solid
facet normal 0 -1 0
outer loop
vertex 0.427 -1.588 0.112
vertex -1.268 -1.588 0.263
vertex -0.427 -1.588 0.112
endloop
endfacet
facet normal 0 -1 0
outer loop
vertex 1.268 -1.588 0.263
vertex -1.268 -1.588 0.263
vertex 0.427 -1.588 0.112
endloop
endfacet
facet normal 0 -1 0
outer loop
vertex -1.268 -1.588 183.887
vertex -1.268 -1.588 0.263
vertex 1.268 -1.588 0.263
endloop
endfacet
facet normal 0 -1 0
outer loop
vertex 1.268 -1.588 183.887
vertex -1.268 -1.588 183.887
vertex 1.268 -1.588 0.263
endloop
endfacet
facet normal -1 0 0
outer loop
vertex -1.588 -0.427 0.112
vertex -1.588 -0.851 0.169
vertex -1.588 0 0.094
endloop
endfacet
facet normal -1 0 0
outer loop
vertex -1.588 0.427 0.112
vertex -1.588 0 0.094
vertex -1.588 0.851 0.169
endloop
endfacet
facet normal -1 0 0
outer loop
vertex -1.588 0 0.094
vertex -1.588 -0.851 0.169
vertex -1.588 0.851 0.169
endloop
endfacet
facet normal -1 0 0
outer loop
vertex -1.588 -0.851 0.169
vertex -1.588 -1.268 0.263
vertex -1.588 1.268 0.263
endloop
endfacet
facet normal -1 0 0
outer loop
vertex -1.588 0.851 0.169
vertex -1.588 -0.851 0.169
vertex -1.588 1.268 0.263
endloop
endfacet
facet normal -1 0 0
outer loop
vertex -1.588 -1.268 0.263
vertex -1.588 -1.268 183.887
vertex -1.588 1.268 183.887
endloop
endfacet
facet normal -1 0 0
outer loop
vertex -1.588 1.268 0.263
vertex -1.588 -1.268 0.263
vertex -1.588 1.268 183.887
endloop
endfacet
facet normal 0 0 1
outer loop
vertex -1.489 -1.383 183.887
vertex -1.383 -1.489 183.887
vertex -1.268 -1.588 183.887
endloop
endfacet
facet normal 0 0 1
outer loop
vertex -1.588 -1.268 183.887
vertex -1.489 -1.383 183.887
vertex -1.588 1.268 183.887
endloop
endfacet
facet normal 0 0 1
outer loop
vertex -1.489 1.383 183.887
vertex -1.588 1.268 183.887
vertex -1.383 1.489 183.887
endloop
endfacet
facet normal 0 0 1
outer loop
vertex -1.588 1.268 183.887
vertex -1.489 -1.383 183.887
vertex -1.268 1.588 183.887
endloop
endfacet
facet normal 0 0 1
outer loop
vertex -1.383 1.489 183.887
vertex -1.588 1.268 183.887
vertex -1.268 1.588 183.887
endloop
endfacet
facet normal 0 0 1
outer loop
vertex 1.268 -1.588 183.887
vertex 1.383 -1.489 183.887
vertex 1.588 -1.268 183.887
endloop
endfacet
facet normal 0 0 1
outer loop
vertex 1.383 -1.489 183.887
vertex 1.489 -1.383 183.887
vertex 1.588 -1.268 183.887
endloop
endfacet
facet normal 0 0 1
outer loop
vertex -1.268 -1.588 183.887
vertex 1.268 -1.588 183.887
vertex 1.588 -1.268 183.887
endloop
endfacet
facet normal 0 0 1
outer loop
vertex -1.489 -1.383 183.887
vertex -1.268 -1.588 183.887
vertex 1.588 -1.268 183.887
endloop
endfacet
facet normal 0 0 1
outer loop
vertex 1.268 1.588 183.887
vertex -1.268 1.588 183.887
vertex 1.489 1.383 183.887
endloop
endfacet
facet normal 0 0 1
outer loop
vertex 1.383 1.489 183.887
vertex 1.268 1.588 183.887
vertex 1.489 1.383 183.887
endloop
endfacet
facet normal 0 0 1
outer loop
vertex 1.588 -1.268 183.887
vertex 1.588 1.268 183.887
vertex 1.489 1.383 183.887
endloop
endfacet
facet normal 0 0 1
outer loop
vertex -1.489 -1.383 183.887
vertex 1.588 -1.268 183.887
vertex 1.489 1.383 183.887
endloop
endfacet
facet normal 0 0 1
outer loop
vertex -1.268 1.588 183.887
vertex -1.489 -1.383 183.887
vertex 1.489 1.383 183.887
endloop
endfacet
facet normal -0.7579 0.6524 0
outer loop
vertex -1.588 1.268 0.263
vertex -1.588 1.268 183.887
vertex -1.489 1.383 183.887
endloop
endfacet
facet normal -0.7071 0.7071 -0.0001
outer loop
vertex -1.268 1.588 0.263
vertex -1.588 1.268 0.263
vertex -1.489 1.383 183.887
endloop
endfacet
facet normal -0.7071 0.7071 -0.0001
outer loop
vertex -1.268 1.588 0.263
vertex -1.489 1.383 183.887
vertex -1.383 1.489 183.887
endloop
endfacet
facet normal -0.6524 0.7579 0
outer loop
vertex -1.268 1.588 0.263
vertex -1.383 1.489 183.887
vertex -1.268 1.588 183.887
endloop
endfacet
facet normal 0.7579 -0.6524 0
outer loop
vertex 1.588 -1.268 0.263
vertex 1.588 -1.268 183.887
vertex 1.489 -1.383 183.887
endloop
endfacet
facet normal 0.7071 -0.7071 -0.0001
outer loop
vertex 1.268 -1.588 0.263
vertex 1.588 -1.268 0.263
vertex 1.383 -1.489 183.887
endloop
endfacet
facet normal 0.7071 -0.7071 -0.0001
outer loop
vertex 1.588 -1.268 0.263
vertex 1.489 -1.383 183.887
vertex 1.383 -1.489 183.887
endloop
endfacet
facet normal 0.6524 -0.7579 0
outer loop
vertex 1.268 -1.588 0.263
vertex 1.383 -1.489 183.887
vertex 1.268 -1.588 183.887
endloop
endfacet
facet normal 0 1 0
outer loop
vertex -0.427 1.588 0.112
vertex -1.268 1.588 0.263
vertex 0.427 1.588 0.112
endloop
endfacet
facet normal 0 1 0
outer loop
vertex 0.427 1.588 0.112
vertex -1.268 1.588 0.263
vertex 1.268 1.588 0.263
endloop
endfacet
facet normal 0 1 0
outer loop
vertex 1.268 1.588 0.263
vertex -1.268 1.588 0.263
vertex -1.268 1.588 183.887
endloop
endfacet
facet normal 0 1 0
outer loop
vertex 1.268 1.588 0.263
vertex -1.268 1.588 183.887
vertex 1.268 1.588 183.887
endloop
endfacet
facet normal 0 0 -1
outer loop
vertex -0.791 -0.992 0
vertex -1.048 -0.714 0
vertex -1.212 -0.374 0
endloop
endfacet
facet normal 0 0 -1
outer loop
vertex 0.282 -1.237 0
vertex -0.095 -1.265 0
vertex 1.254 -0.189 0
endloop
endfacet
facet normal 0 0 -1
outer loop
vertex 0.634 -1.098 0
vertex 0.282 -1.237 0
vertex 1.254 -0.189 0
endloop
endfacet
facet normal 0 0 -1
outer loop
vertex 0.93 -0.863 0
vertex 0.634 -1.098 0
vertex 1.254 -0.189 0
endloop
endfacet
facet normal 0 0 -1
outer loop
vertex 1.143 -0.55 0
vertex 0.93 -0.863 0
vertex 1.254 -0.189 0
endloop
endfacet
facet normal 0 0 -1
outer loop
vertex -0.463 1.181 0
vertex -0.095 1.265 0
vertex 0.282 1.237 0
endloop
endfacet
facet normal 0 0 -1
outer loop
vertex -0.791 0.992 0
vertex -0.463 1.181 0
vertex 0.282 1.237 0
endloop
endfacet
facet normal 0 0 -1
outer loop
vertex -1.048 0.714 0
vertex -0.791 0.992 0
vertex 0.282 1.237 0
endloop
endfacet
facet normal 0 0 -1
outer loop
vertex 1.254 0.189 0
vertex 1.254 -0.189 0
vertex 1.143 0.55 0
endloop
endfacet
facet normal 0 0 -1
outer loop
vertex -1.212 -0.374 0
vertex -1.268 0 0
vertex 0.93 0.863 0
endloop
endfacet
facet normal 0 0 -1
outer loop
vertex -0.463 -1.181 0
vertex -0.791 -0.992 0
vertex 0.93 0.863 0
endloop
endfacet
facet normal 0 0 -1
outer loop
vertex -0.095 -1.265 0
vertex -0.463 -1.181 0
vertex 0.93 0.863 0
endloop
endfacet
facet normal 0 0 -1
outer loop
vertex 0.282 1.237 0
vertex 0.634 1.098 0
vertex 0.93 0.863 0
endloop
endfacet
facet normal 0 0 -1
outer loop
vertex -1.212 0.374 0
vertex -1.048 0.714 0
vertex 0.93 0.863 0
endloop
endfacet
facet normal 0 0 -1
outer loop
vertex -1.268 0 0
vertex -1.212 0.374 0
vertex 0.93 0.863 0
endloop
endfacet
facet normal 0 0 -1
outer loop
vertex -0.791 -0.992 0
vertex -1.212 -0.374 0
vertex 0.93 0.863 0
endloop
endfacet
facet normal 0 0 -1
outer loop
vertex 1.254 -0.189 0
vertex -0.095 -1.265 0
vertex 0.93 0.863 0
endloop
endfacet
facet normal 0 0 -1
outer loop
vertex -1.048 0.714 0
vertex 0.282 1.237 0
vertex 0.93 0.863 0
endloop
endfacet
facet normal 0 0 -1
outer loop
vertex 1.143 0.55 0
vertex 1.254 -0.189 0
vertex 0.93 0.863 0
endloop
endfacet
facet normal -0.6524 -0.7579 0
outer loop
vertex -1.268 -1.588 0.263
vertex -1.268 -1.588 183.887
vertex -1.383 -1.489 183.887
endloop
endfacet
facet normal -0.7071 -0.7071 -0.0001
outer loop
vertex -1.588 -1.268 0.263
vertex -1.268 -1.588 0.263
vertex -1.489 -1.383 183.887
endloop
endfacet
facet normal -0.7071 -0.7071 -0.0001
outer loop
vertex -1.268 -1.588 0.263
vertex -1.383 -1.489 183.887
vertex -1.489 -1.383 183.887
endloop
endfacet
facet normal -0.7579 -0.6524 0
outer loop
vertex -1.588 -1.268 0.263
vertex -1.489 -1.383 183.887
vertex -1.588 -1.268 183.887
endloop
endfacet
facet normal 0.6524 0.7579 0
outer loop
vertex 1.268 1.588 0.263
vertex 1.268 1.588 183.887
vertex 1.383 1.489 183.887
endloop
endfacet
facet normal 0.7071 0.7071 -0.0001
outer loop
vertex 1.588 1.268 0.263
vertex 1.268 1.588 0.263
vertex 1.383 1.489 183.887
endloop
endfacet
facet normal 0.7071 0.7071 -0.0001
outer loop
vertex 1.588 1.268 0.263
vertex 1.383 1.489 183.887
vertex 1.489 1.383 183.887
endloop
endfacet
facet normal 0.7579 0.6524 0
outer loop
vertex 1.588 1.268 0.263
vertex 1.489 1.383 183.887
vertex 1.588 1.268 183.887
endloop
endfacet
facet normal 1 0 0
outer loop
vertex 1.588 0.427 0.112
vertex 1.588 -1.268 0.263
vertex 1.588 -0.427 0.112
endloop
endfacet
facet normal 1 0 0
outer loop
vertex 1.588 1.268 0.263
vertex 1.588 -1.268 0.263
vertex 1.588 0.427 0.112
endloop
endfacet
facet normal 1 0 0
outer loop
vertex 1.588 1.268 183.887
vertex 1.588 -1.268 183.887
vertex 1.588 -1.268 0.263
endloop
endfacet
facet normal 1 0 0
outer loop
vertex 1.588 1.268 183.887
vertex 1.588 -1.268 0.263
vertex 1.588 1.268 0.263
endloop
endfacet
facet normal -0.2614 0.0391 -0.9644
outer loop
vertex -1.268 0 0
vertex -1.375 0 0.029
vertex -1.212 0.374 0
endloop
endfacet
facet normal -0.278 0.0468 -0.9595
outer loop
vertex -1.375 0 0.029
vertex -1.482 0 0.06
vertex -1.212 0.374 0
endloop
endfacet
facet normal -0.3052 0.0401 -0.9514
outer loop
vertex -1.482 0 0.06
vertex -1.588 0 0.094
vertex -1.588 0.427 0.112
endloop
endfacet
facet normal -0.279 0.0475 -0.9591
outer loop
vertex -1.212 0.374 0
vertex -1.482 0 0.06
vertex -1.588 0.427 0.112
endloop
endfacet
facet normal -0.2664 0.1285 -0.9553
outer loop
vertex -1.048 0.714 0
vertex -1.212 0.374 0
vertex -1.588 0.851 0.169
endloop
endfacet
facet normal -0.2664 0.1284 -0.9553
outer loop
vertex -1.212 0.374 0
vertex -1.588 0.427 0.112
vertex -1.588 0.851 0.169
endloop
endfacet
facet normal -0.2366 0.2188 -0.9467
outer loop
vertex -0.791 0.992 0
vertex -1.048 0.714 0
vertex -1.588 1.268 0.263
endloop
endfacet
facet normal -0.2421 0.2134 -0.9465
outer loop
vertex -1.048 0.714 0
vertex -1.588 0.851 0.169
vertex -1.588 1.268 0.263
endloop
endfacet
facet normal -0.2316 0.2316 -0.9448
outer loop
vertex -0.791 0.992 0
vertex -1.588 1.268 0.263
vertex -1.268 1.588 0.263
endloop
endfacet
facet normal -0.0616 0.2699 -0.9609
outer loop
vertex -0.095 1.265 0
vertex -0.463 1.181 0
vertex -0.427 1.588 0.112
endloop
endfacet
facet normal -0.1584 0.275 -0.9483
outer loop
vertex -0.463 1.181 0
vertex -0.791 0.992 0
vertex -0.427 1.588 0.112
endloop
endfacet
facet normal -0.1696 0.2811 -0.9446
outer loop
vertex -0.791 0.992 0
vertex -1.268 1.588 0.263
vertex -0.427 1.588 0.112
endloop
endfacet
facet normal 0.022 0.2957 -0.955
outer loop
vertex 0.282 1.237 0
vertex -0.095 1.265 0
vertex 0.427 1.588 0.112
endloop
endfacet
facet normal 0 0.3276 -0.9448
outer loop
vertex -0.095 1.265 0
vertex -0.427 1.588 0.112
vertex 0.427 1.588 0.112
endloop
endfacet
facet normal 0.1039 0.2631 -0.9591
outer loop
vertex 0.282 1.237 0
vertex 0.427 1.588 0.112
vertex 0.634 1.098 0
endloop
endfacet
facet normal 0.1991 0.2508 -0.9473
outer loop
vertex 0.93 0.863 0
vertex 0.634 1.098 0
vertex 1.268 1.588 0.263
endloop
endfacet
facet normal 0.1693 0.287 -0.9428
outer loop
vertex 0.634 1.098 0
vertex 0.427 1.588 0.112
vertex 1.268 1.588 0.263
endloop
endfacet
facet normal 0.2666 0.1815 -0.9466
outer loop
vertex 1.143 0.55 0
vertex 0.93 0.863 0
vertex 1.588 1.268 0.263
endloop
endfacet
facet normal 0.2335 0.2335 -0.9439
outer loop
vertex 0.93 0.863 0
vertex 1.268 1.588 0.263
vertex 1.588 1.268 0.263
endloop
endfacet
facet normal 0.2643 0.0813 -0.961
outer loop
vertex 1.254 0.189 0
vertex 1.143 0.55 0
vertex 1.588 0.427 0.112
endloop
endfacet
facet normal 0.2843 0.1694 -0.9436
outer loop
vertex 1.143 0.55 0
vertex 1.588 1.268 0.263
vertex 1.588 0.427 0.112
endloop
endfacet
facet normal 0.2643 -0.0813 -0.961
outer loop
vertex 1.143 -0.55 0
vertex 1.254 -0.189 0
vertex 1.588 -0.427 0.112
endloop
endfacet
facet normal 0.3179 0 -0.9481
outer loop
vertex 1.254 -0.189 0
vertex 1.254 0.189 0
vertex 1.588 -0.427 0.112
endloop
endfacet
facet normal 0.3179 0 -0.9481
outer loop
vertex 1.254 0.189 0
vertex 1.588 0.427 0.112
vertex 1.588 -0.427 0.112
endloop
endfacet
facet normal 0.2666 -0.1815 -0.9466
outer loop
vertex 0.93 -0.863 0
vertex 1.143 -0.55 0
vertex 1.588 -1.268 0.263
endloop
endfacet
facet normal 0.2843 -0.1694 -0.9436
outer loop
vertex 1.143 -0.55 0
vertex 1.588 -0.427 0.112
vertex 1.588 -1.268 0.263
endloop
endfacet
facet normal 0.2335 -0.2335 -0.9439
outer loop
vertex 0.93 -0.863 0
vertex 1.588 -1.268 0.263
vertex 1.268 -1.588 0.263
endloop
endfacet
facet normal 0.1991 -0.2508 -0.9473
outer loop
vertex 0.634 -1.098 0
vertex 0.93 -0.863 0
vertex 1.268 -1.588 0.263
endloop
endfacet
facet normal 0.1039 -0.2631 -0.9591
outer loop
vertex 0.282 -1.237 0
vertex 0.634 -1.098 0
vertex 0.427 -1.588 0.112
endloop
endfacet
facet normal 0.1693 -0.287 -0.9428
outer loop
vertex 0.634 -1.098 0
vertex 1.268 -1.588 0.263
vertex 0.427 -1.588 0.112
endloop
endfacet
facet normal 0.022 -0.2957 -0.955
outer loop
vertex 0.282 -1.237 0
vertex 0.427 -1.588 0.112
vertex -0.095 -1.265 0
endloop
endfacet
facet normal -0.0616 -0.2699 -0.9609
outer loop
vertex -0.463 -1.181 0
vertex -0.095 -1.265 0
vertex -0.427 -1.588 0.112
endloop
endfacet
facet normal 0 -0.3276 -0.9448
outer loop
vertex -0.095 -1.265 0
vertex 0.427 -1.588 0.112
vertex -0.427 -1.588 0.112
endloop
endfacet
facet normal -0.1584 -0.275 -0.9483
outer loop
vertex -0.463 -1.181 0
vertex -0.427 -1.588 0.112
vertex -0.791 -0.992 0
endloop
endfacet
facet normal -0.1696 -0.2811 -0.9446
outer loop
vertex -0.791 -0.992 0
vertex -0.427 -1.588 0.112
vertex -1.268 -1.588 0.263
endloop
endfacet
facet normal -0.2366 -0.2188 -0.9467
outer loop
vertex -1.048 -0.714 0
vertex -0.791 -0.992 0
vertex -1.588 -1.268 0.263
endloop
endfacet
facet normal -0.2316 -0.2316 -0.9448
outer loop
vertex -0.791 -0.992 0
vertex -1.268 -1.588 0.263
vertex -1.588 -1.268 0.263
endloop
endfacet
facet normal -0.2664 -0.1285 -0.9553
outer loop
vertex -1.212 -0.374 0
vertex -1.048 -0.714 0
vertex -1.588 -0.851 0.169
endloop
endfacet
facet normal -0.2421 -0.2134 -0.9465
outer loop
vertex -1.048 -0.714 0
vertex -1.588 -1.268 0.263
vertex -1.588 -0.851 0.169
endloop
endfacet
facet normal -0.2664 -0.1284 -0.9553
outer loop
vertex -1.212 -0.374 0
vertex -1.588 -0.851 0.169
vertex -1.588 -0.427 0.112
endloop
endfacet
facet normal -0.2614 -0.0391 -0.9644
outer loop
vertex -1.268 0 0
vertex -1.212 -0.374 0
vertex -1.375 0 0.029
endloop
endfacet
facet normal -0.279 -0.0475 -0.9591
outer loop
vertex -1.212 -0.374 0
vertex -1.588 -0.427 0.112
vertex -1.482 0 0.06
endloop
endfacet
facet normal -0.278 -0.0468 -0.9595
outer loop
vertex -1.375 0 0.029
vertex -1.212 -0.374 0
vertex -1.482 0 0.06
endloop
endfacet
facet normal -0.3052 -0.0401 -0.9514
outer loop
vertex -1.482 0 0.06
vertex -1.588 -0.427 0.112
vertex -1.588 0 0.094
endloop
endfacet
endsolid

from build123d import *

# Parameters (mm, degrees)
SKETCH1_W           = 3.175
SKETCH1_H           = 3.175
BOSS_EXTRUDE1_DEPTH = 152.4
SKETCH2_OUTSIDE_W   = 35.668
SKETCH2_OUTSIDE_H   = 35.668
SKETCH2_OUTSIDE_R   = 2.032
CUT_EXTRUDE1_DEPTH  = 153.416535561
SKETCH4_W           = 120.65
SKETCH4_H           = 3.175
CUT_EXTRUDE2_DEPTH  = 305.820669872


with BuildPart() as part:
    # Sketch1 → Boss-Extrude1 (new body)
    with BuildSketch(Plane.XY):
        Rectangle(SKETCH1_W, SKETCH1_H)
    extrude(amount=BOSS_EXTRUDE1_DEPTH)

    # Sketch2 outside → Cut-Extrude1 (cut, through all)
    with BuildSketch(Plane(origin=(0, 0, 0), x_dir=(-1, 0, 0), z_dir=(0, 0, -1))):
        Rectangle(SKETCH2_OUTSIDE_W, SKETCH2_OUTSIDE_H)
        Circle(SKETCH2_OUTSIDE_R, mode=Mode.SUBTRACT)
    extrude(amount=-CUT_EXTRUDE1_DEPTH, mode=Mode.SUBTRACT)

    # Sketch3 → Cut-Revolve1 (revolve, cut)
    with BuildSketch(Plane(origin=(0, 0, 0), x_dir=(1, 0, 0), z_dir=(0, 1, 0))):
        with BuildLine():
            Line((-5.053685963, -4.40273269), (-5.053685963, 5.740530545))
            Line((-5.053685963, 5.740530545), (0, 5.740530545))
            Line((0, 5.740530545), (0, 0.160877736))
            ThreePointArc((0, 0.160877736), (-3.404639553, -1.148866368), (-5.053685963, -4.40273269))
        make_face()
    revolve(axis=Axis((0, 0, 152.4), (0, 0, -1)), mode=Mode.SUBTRACT)

    # Mirror1: part across plane


with BuildPart() as part_1:
    add(part.part)
    add(part.part.mirror(Plane(origin=(0, 0, 152.4), x_dir=(1, 0, 0), z_dir=(0, 0, -1))))

    # Sketch4 → Cut-Extrude2 (cut, through all)
    with BuildSketch(Plane(origin=(1.5875, 0, 0), x_dir=(0, 0, -1), z_dir=(1, 0, 0))):
        with Locations((-244.211774642, 0)):
            Rectangle(SKETCH4_W, SKETCH4_H)
    extrude(amount=-CUT_EXTRUDE2_DEPTH, mode=Mode.SUBTRACT)


with BuildPart() as body_2:
    # of the pieces the cut leaves, the one that is kept (cut_extrude2_keep)
    add(part_1.part.solids().sort_by_distance((1.268411507, -1.5875, 0.263225358))[0])


solid = body_2.part
